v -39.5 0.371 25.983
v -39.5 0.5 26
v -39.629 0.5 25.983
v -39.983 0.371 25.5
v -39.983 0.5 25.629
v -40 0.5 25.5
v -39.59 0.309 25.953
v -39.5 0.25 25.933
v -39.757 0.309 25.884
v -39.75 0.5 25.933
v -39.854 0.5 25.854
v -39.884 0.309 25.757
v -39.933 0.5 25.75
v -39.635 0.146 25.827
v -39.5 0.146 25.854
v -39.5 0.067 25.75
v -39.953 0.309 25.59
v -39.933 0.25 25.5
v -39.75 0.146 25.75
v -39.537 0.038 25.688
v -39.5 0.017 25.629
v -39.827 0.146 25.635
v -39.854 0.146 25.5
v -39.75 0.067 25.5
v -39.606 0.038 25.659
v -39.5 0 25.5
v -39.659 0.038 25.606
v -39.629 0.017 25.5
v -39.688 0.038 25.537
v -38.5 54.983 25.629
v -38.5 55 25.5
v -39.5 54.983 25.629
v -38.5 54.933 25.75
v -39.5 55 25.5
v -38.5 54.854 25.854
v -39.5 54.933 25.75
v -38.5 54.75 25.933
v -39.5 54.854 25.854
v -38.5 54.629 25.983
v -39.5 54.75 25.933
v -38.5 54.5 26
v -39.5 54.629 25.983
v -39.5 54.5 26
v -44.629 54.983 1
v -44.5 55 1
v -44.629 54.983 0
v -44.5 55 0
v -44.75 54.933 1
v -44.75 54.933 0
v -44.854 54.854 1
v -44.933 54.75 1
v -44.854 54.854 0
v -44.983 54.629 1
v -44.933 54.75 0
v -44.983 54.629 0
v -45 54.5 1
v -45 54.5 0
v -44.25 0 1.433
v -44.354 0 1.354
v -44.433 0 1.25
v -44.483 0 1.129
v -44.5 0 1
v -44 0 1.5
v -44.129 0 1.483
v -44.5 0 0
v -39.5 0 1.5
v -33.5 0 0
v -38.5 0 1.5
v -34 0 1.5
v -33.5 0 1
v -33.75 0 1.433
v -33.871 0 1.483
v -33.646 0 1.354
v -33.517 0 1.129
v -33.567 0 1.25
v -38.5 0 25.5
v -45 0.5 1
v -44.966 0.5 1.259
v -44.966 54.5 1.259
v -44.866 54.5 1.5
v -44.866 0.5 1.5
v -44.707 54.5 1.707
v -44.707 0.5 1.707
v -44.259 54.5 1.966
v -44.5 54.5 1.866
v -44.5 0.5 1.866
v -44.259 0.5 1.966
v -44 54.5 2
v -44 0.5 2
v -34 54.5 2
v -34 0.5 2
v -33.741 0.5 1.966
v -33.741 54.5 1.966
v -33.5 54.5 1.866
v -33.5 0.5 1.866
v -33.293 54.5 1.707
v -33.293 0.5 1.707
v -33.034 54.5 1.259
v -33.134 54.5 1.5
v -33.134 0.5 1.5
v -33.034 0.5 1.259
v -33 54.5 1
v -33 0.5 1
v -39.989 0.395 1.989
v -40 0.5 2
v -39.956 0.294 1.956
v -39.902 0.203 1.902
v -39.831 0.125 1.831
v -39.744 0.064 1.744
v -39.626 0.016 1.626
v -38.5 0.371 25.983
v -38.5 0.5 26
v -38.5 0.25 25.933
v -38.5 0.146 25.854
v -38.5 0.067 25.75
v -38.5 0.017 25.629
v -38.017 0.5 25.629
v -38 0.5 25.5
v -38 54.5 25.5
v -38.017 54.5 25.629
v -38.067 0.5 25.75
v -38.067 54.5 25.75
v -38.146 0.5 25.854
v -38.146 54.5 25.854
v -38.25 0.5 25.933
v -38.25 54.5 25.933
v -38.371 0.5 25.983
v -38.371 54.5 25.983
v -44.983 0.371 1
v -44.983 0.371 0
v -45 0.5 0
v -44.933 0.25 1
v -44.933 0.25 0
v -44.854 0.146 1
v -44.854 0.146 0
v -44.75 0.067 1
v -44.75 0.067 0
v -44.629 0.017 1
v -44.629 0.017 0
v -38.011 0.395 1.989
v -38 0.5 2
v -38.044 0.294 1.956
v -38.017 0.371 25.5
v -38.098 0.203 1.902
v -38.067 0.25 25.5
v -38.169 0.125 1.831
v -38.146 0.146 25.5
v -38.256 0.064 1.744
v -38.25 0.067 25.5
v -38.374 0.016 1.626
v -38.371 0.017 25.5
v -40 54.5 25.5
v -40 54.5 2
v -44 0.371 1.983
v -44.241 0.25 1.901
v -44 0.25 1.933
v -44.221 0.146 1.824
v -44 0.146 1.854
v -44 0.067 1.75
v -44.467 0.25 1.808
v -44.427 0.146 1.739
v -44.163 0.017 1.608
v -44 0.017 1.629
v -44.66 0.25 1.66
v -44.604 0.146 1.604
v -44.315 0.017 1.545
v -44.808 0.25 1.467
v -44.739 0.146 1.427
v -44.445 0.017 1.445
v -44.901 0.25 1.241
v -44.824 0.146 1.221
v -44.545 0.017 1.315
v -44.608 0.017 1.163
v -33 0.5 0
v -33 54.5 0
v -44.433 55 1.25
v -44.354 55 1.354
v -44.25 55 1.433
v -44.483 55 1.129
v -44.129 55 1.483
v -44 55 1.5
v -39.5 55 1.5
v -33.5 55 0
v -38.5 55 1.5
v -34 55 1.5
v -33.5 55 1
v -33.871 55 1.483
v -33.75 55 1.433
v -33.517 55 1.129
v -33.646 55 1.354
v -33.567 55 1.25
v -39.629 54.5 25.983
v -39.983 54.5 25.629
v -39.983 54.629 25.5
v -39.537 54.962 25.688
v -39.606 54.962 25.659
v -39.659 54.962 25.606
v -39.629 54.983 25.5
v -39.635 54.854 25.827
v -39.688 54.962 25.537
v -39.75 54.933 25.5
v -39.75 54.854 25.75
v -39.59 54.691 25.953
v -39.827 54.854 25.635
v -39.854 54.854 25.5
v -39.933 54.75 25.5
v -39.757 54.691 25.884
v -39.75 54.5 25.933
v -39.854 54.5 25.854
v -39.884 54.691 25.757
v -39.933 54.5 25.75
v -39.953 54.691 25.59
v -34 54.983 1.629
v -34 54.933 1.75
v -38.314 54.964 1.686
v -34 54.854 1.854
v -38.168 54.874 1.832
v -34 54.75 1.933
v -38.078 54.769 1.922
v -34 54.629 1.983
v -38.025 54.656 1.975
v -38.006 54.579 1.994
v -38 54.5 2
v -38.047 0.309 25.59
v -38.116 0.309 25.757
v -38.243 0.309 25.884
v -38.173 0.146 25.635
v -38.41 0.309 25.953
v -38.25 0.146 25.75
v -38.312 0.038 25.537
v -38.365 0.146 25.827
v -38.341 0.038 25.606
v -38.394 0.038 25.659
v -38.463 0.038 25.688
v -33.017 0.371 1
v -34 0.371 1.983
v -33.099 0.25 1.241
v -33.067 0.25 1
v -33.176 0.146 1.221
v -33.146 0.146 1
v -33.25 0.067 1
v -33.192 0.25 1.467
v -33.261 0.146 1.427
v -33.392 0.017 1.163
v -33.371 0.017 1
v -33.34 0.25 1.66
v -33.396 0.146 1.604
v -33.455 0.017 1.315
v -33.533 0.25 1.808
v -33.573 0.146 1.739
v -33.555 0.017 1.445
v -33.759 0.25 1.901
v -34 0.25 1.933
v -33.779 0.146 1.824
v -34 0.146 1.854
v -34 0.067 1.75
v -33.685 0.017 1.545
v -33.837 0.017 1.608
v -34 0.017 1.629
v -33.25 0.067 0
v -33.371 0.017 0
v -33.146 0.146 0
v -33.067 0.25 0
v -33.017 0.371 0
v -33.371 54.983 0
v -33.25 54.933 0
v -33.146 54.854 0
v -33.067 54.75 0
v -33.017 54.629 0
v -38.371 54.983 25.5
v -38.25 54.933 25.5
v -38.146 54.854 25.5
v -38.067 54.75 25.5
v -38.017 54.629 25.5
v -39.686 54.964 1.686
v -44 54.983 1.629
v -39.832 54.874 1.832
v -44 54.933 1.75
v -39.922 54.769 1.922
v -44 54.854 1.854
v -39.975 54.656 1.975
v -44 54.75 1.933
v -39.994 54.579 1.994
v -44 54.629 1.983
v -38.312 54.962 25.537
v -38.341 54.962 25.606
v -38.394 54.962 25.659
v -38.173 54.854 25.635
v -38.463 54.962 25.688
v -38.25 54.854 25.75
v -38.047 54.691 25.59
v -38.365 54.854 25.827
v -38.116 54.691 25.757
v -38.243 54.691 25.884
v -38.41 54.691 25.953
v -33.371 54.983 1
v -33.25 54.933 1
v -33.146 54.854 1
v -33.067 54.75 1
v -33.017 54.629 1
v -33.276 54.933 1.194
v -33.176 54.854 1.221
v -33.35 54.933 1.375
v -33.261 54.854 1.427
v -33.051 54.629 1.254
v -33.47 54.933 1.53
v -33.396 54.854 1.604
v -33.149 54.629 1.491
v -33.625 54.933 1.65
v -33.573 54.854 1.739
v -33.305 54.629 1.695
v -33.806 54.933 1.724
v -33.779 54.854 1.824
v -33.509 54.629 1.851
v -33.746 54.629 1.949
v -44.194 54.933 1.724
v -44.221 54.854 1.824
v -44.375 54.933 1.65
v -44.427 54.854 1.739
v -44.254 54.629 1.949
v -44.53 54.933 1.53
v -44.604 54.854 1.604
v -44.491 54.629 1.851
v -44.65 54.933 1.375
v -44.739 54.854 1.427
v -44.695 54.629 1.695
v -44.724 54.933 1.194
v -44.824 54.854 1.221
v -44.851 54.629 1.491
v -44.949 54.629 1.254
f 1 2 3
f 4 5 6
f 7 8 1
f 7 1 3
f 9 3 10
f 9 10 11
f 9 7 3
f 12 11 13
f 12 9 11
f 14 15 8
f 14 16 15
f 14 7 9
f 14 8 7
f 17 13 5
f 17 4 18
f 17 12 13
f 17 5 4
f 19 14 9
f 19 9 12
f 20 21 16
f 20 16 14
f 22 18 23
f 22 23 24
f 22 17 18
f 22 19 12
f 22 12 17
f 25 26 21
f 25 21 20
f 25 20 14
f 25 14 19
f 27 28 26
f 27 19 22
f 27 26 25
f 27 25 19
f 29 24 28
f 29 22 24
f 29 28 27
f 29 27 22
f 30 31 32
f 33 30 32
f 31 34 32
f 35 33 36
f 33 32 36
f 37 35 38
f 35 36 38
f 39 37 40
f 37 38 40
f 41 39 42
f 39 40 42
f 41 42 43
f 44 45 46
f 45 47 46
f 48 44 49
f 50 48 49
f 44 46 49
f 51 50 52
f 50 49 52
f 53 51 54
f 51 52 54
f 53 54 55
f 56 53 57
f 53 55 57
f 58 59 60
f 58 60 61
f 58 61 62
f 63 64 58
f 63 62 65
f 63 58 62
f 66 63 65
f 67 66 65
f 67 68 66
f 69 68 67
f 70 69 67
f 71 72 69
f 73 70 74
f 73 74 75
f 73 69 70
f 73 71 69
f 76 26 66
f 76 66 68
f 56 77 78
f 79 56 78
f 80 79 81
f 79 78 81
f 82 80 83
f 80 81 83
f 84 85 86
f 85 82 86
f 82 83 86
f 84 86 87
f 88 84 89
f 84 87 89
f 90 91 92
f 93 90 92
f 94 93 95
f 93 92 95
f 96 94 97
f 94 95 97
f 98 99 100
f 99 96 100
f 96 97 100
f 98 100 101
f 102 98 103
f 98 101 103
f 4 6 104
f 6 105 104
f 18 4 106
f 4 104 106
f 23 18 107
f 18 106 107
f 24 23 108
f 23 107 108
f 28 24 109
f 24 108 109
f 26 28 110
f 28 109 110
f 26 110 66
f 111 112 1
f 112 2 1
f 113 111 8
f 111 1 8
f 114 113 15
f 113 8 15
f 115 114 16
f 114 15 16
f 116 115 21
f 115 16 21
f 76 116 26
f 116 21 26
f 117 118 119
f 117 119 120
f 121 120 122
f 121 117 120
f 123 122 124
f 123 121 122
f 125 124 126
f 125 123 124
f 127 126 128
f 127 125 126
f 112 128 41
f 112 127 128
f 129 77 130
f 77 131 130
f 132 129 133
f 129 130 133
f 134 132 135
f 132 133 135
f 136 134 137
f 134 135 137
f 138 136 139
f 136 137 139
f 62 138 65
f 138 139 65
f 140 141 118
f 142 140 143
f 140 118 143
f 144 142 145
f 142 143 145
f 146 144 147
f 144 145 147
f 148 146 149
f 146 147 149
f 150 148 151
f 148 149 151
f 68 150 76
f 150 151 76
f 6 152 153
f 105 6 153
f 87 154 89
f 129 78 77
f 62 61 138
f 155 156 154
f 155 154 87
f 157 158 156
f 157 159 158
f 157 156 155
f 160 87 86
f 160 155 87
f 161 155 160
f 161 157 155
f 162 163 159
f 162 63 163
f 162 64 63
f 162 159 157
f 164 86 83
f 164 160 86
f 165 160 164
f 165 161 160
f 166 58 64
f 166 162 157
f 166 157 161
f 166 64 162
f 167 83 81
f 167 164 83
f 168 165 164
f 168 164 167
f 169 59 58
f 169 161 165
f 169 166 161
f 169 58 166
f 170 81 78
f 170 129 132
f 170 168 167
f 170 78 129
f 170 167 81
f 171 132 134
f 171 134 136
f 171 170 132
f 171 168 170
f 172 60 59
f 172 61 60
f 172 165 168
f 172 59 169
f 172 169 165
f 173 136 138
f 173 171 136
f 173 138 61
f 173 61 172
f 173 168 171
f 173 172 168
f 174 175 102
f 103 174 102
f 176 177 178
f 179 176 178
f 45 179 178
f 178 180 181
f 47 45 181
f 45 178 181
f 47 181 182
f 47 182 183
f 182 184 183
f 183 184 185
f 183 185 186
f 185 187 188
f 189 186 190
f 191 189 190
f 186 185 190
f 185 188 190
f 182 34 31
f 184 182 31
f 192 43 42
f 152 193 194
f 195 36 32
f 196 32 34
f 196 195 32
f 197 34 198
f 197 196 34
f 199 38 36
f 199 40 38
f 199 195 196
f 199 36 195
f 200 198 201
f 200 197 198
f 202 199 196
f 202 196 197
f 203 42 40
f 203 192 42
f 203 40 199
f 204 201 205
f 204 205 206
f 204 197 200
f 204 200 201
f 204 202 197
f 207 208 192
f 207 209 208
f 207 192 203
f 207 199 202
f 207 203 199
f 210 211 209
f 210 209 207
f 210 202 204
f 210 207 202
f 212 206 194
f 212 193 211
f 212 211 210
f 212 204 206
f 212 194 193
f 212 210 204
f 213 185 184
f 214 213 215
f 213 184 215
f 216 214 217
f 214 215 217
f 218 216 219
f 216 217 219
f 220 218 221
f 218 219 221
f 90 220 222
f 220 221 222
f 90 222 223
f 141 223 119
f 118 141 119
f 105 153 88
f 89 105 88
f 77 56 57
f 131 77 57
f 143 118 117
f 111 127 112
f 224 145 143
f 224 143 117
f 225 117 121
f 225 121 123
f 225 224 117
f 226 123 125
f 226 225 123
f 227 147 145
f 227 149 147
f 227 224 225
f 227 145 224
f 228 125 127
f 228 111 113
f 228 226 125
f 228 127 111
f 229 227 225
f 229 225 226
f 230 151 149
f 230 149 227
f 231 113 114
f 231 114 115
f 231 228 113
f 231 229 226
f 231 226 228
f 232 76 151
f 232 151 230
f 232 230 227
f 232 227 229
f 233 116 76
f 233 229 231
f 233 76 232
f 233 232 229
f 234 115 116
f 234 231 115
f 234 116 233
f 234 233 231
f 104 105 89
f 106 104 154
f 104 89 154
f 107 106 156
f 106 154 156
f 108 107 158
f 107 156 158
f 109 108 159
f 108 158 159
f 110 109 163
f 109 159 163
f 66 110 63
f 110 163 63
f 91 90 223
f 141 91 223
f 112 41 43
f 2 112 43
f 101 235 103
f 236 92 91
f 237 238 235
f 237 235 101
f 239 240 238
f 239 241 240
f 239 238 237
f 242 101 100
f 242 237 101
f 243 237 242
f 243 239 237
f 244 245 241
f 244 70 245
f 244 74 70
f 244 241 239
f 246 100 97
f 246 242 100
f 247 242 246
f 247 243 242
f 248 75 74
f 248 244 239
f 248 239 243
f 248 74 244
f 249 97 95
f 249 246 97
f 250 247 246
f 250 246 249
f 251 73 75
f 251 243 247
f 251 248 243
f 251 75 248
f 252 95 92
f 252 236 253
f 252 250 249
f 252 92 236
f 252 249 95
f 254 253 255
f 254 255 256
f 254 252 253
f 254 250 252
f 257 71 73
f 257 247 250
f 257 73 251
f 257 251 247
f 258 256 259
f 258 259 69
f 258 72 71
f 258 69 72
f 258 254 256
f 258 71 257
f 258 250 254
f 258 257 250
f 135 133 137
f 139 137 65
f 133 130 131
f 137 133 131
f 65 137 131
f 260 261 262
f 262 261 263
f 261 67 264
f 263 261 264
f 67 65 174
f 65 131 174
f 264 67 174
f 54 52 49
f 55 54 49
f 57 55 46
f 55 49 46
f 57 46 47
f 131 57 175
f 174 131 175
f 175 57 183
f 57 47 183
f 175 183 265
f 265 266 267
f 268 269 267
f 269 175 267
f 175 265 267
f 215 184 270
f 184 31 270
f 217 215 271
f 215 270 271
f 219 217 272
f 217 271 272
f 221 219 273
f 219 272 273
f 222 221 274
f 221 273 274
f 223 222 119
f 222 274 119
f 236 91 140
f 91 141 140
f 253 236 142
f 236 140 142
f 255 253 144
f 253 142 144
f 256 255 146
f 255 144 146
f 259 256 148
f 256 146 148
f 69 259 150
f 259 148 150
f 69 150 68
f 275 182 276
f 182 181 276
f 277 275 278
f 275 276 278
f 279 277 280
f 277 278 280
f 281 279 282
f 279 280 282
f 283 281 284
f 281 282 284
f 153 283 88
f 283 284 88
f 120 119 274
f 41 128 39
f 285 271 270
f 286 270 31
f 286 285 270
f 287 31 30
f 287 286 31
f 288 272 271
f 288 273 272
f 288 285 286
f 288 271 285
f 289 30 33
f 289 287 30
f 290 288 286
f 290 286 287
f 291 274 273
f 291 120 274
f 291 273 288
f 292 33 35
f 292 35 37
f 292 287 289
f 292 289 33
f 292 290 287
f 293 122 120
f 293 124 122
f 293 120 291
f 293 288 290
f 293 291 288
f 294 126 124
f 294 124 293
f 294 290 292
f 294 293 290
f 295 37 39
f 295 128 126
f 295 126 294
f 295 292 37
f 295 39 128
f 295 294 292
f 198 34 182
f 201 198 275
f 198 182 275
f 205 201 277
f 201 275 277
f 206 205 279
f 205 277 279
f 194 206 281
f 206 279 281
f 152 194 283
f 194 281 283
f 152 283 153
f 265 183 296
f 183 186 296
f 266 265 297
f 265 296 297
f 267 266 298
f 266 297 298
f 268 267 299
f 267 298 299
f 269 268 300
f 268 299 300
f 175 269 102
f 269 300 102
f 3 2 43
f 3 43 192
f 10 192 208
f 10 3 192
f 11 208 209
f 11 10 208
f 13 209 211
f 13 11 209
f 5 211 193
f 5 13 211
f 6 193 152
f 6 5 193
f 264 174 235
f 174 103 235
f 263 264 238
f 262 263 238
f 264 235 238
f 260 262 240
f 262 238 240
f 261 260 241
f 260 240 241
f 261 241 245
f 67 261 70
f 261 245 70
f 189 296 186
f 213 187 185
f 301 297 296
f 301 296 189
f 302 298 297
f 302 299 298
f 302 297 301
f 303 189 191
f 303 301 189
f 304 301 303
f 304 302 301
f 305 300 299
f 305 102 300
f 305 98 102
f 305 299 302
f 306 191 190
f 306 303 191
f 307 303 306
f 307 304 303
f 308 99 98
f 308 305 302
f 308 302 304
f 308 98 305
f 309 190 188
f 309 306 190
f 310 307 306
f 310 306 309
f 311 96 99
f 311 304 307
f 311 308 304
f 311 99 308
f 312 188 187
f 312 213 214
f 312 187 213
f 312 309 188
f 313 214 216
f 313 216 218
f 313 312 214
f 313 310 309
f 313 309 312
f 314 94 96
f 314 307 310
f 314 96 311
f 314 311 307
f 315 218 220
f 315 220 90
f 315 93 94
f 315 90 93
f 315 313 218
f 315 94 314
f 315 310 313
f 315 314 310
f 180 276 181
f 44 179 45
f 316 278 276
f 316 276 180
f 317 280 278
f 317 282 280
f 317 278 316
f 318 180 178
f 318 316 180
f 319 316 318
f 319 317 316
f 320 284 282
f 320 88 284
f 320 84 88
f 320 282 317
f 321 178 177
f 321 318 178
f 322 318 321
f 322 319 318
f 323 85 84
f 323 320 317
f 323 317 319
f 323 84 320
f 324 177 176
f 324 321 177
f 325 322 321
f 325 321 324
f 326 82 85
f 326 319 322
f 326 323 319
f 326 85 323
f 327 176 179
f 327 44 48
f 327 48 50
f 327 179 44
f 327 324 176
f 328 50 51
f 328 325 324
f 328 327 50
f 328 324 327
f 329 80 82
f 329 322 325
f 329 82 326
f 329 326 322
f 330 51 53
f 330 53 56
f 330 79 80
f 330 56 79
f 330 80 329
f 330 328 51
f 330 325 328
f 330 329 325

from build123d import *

# Parameters (mm, degrees)
PAD007_DEPTH = 55
FILLET008_R  = 0.5
FILLET009_R  = 1
FILLET010_R  = 0.5
FILLET011_R  = 0.5


with BuildPart() as part:
    # Sketch014 → Pad007 (new body)
    with BuildSketch(Plane.XZ):
        Polygon((0, 0), (12, 0), (12, 2), (7, 2), (7, 26), (5, 26), (5, 2), (0, 2), align=None)
    extrude(amount=PAD007_DEPTH)

    # Fillet008
    fillet008_edges = [part.edges().sort_by_distance(p)[0] for p in [
        (5, -27.5, 26),
        (7, -27.5, 26),
    ]]
    fillet(fillet008_edges, radius=FILLET008_R)

    # Fillet009
    fillet009_edges = [part.edges().sort_by_distance(p)[0] for p in [
        (0, -27.5, 2),
        (12, -27.5, 2),
    ]]
    fillet(fillet009_edges, radius=FILLET009_R)

    # Fillet010
    fillet010_edges = [part.edges().sort_by_distance(p)[0] for p in [
        (5, -55, 13.75),
        (5.146447, -55, 25.853553),
        (6, -55, 26),
        (6.853553, -55, 25.853553),
        (7, -55, 13.75),
        (3, -55, 2),
        (0.292893, -55, 1.707107),
        (0, -55, 0.5),
        (9, -55, 2),
        (11.707107, -55, 1.707107),
        (12, -55, 0.5),
    ]]
    fillet(fillet010_edges, radius=FILLET010_R)

    # Fillet011
    fillet011_edges = [part.edges().sort_by_distance(p)[0] for p in [
        (12, 0, 0.5),
        (11.707107, 0, 1.707107),
        (9, 0, 2),
        (7, 0, 13.75),
        (6.853553, 0, 25.853553),
        (6, 0, 26),
        (5.146447, 0, 25.853553),
        (5, 0, 13.75),
        (3, 0, 2),
        (0.292893, 0, 1.707107),
        (0, 0, 0.5),
    ]]
    fillet(fillet011_edges, radius=FILLET011_R)


with BuildPart() as part_1:
    # Body003 placement: moved
    add(part.part.moved(Location((-45, 55, 0))))


solid = part_1.part
